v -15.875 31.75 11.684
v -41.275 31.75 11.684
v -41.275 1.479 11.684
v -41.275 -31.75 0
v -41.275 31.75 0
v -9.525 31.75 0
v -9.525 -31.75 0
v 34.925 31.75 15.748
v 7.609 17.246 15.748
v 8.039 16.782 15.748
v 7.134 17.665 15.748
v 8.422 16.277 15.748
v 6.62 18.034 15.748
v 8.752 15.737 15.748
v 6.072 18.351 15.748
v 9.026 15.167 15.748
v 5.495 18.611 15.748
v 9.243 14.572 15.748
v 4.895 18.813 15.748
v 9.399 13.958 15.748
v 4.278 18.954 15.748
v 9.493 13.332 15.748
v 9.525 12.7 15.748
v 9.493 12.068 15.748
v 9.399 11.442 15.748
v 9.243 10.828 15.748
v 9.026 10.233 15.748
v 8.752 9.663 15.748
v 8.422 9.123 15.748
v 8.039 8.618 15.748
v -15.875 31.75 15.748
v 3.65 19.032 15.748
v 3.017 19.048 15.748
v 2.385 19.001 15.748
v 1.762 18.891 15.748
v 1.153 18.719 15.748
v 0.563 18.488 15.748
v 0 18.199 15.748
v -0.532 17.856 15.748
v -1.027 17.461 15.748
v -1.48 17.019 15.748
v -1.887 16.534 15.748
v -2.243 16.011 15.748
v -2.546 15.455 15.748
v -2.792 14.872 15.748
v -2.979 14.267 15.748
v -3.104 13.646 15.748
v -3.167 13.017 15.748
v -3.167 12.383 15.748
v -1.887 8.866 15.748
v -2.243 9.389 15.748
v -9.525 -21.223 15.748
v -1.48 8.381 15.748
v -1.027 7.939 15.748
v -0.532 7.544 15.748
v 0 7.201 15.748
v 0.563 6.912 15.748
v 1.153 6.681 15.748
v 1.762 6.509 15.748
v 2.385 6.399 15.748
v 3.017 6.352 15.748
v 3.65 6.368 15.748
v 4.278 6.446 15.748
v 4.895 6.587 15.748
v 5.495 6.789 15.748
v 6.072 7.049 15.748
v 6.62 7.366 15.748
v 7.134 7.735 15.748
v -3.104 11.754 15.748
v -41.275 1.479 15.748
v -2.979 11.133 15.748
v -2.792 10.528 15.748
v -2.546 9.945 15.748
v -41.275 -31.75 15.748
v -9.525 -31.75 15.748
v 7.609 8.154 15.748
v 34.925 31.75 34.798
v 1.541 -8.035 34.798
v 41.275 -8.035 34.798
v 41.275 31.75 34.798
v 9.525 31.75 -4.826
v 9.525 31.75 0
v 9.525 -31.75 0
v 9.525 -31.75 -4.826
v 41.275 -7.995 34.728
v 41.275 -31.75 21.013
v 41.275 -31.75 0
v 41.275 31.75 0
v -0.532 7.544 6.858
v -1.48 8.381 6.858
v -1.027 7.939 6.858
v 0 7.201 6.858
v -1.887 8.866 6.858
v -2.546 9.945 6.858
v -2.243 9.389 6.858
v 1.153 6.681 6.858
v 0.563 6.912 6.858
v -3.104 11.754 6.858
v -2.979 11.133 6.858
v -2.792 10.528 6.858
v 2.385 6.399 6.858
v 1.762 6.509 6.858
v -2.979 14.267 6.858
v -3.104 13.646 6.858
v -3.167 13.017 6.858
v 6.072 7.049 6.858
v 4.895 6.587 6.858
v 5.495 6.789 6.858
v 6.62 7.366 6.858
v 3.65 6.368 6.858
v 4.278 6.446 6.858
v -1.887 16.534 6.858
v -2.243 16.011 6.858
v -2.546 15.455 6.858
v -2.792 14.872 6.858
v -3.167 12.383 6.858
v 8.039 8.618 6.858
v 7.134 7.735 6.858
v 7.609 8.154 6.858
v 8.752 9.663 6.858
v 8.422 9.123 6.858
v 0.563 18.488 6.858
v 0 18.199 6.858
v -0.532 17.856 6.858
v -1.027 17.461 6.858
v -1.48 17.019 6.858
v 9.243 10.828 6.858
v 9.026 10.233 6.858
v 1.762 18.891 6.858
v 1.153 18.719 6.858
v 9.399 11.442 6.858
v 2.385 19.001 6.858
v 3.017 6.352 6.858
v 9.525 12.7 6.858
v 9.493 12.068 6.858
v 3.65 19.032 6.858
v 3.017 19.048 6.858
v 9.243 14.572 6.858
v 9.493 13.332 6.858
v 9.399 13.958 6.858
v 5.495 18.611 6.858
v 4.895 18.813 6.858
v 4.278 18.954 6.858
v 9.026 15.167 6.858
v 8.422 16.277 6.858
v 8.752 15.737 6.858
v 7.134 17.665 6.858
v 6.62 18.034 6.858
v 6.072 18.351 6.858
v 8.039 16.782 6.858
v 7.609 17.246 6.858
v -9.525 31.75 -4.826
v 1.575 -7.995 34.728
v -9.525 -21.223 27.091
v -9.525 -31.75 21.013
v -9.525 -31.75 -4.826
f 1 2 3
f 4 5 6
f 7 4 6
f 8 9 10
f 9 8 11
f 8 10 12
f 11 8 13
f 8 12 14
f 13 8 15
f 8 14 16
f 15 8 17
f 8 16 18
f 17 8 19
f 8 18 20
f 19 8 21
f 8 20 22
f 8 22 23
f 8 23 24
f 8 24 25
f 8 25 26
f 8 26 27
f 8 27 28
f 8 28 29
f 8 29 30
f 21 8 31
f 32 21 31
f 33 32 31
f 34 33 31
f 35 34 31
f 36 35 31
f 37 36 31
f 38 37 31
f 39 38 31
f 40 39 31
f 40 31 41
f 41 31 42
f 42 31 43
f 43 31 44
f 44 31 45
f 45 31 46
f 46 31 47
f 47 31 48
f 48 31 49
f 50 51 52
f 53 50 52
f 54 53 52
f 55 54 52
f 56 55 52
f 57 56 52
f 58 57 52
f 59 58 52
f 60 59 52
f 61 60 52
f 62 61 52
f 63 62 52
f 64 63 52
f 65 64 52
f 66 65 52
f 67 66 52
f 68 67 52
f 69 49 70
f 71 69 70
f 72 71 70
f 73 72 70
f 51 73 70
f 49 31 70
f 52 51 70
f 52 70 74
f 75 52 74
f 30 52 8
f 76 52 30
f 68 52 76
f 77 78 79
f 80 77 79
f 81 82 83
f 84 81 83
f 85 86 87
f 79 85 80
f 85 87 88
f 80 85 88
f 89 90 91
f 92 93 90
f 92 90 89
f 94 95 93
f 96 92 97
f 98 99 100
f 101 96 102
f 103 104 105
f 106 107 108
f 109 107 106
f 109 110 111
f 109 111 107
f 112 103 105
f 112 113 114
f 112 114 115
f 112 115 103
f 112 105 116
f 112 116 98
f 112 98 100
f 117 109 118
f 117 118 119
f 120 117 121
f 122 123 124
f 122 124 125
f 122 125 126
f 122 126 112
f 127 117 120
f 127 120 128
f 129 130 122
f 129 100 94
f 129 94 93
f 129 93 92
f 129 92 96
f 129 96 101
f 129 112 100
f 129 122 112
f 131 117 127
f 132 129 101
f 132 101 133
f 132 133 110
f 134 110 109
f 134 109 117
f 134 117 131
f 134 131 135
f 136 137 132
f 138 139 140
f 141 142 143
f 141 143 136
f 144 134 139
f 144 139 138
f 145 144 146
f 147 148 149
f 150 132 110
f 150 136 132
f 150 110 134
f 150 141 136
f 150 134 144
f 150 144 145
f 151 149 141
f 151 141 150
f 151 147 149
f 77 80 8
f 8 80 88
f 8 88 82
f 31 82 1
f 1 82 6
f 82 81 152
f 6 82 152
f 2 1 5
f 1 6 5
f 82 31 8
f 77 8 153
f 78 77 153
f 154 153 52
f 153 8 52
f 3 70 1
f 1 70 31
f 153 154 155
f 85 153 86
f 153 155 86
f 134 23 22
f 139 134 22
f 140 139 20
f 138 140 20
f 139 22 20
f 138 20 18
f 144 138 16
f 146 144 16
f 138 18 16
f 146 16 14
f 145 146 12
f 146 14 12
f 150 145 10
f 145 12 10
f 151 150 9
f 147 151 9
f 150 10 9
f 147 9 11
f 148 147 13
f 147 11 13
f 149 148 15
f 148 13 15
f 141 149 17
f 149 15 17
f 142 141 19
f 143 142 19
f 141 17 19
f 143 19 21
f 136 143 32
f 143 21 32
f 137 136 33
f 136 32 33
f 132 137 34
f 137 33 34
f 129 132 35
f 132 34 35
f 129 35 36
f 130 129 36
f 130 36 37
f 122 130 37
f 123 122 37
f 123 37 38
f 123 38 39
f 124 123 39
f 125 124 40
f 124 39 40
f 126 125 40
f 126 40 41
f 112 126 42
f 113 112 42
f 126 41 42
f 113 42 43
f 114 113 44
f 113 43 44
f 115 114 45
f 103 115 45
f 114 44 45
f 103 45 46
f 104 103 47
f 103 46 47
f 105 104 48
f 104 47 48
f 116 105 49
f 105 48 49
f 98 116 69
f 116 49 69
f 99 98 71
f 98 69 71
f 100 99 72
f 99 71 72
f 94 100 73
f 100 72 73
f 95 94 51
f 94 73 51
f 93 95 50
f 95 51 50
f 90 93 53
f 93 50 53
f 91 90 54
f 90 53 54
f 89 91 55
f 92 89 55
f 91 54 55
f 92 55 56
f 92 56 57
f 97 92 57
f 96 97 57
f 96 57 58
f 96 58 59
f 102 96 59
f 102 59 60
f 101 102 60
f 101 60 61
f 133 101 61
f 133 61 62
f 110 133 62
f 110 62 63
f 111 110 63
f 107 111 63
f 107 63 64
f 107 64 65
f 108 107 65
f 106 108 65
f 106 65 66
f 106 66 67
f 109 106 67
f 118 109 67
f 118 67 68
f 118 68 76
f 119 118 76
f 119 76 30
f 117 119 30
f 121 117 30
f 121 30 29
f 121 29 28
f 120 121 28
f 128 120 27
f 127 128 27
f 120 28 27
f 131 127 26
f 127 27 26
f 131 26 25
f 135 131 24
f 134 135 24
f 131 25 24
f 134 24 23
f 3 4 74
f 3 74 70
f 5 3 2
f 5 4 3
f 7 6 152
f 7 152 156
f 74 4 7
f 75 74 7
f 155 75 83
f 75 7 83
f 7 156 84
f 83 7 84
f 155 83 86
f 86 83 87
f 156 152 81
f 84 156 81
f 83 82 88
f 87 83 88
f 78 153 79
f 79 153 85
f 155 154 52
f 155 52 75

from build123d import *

# Parameters (mm, degrees)
F0_W      = 82.55
F0_H      = 63.5
F1_DEPTH  = 15.748
F3_DEPTH  = 4.064
F4_W      = 19.05
F4_H      = 63.5
F5_DEPTH  = 4.826
F7_DEPTH  = 19.05
F8_R      = 6.35
F9_DEPTH  = 8.89
F14_DEPTH = 25.4
F16_DEPTH = 25.4
F18_W     = 23.9344900474
F18_H     = 17.6518000662
F19_DEPTH = 31.75


with BuildPart() as f1:
    # F0 (on Top) → F1 (new body)
    with BuildSketch(Plane.XY):
        Rectangle(F0_W, F0_H)
    extrude(amount=F1_DEPTH)

    # F2 (on face) → F3 (cut)
    with BuildSketch(Plane.XY.offset(15.748)):
        Polygon((-41.275, 1.4794587481), (-15.875, 31.75), (-41.275, 31.75), align=None)
    extrude(amount=-F3_DEPTH, mode=Mode.SUBTRACT)

    # F4 (on face) → F5 (join)
    with BuildSketch(Plane(origin=(0, 0, 0), x_dir=(1, 0, 0), z_dir=(0, 0, -1))):
        Rectangle(F4_W, F4_H)
    extrude(amount=F5_DEPTH)

    # F6 (on face) → F7 (join)
    with BuildSketch(Plane.XY.offset(15.748)):
        Polygon((41.275, -31.75), (41.275, 31.75), (34.925, 31.75), (-18.3578265798, -31.75), align=None)
    extrude(amount=F7_DEPTH)

    # F8 (on face) → F9 (cut)
    with BuildSketch(Plane.XY.offset(15.748)):
        with Locations((3.175, 12.7)):
            Circle(F8_R)
    extrude(amount=-F9_DEPTH, mode=Mode.SUBTRACT)

    # F13 (on face) → F14 (cut)
    with BuildSketch(Plane(origin=(0, -17.0362972024, 29.5082354343), x_dir=(1, 0, 0), z_dir=(0, 0.4999936063, -0.8660290951))):
        Polygon((-18.5759086162, 20.4719938338), (-20.111516118, 17.1120017767), (0, -10.4399453849), (43.6191521585, -10.4399453849), (43.6191521585, 20.4719938338), align=None)
    extrude(amount=-F14_DEPTH, mode=Mode.SUBTRACT)

    # F15 (on face) → F16 (cut)
    with BuildSketch(Plane(origin=(4.8610082234, -4.0788702074, 0), x_dir=(-0.6427876097, -0.7660444431, 0), z_dir=(-0.7660444431, 0.6427876097, 0))):
        Polygon((36.1220945353, 34.798), (14.8864189693, 34.798), (36.1220945353, 25.5741356141), align=None)
    extrude(amount=-F16_DEPTH, mode=Mode.SUBTRACT)

    # F18 (on offset) → F19 (cut)
    with BuildSketch(Plane(origin=(-41.275, 0, 0), x_dir=(0, -1, 0), z_dir=(-1, 0, 0))):
        with Locations((27.5025297888, 24.5739000331)):
            Rectangle(F18_W, F18_H)
    extrude(amount=-F19_DEPTH, mode=Mode.SUBTRACT)


solid = f1.part
